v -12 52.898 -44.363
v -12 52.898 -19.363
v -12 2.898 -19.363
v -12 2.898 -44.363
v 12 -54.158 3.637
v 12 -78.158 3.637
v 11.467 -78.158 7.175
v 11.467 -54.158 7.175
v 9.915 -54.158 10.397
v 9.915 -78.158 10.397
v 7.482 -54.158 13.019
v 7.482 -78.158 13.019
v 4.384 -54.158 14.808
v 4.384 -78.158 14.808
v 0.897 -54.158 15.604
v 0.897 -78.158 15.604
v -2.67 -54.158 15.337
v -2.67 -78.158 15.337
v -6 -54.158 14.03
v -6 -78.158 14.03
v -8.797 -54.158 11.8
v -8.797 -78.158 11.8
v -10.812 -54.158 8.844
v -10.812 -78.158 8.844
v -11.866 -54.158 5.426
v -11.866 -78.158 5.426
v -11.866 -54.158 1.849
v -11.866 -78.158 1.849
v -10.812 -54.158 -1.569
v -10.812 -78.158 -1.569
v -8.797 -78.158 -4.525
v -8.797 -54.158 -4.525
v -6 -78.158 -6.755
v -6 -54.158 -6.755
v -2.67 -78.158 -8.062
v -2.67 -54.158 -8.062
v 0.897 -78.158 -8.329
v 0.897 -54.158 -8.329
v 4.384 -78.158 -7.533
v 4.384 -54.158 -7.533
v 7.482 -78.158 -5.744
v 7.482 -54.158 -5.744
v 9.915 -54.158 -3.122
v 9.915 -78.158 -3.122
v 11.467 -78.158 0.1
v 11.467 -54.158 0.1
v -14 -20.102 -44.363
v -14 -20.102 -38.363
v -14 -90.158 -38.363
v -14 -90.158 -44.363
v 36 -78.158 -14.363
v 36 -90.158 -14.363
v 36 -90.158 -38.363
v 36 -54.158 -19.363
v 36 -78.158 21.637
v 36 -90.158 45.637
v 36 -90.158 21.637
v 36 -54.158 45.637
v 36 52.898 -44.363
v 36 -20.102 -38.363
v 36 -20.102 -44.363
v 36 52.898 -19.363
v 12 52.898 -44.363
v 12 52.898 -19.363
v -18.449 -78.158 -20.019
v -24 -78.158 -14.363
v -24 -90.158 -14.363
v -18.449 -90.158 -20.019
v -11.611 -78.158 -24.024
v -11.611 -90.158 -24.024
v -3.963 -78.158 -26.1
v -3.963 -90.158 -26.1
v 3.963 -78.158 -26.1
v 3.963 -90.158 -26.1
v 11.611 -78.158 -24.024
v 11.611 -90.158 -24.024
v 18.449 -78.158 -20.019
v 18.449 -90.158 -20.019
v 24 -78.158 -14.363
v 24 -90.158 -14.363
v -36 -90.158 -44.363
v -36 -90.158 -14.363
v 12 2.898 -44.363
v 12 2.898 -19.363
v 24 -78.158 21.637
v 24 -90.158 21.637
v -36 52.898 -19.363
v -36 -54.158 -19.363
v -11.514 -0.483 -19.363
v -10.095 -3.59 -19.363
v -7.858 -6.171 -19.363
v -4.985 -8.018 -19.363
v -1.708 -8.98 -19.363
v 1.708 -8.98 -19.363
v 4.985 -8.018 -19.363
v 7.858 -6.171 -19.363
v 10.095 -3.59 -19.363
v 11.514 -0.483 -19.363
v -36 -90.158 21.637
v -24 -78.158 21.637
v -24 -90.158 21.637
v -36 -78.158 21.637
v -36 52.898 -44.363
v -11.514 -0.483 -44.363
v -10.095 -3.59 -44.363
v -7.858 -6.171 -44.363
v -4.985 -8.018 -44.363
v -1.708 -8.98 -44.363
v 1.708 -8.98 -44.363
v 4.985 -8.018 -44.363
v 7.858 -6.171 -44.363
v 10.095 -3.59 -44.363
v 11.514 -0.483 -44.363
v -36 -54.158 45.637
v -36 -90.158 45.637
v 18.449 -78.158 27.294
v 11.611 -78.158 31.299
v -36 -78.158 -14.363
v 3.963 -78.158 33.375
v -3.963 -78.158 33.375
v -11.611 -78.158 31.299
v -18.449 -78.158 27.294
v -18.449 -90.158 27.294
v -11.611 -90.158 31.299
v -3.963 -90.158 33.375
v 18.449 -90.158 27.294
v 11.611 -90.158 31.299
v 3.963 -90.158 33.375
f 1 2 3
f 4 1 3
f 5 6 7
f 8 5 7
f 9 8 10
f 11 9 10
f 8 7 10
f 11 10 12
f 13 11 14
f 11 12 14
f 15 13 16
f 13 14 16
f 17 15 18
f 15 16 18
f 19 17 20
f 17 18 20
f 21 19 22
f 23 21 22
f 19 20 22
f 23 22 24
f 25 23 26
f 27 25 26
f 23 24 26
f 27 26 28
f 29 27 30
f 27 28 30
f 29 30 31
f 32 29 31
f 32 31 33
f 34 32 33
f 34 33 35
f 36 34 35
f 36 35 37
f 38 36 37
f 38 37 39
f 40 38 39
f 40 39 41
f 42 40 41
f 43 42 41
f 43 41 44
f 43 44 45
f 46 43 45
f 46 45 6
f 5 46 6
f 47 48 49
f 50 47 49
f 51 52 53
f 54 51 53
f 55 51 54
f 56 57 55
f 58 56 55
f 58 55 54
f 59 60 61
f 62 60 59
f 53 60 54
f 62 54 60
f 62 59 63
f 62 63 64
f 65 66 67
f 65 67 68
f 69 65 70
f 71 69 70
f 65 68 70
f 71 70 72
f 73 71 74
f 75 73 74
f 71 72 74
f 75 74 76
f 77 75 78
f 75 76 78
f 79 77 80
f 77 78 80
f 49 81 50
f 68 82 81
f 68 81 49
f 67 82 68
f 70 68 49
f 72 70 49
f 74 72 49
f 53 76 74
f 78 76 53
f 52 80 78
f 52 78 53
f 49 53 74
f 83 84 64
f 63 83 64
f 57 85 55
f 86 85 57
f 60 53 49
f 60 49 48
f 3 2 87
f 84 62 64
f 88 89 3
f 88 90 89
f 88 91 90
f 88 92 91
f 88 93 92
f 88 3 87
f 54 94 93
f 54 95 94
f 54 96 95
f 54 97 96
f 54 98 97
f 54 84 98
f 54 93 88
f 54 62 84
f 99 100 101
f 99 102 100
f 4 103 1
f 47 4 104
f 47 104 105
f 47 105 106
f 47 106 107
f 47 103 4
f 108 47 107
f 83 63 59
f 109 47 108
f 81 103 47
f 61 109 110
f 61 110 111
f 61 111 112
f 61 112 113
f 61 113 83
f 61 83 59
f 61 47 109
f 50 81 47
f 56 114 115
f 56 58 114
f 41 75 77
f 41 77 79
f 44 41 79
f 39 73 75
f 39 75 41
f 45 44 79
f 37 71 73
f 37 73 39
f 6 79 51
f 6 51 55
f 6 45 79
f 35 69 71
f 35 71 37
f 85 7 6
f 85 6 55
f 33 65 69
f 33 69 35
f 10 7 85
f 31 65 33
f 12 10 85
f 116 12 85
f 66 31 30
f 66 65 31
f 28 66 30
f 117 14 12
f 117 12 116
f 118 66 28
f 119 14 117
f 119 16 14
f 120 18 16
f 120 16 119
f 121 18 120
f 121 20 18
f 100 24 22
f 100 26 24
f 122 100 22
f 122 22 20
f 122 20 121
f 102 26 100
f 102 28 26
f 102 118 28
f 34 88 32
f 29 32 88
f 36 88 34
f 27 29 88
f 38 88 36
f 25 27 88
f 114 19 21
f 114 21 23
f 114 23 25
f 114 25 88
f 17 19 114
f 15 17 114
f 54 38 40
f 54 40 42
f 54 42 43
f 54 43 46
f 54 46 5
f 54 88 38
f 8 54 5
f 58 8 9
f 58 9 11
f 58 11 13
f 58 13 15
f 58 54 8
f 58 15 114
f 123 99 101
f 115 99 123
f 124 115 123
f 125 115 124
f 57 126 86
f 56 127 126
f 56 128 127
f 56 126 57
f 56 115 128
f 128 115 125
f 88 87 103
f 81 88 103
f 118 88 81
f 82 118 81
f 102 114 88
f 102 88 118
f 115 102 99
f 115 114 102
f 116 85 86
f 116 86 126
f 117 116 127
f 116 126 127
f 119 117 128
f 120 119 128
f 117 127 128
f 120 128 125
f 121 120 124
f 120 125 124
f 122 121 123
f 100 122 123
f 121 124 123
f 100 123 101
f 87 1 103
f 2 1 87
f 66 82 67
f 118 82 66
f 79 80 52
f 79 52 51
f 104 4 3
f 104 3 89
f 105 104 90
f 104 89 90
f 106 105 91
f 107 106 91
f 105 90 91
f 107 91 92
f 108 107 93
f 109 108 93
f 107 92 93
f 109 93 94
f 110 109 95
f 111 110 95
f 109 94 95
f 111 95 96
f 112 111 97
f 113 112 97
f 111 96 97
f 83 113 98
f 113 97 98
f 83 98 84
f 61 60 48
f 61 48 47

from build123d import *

# Parameters (mm, degrees)
F1_DEPTH  = 36
F2_W      = 22
F2_H      = 70.056442
F3_DEPTH  = 6
F4_R      = 12
F5_DEPTH  = 143.057441
F6_R      = 30
F7_DEPTH  = 12
F8_W      = 12
F8_H      = 36
F9_W      = 12
F9_H      = 36
F12_DEPTH = 25


with BuildPart() as f1:
    # F0 (on Right) → F1 (new body, symmetric)
    with BuildSketch(Plane.YZ):
        Polygon((-54.158381, 45.637498), (-90.158381, 45.637498), (-90.158381, -38.362502), (-20.101939, -38.362502), (-20.101939, -44.362502), (52.898061, -44.362502), (52.898061, -19.362502), (-54.158381, -19.362502), align=None)
    extrude(amount=F1_DEPTH, both=True)

    # F2 (on face) → F3 (join)
    with BuildSketch(Plane(origin=(0, 0, -38.362502), x_dir=(1, 0, 0), z_dir=(0, 0, -1))):
        with Locations((-25, 55.13016)):
            Rectangle(F2_W, F2_H)
    extrude(amount=F3_DEPTH)

    # F4 (on face) → F5 (cut, through all)
    with BuildSketch(Plane.XZ.offset(90.158381)):
        with Locations((0, 3.637498)):
            Circle(F4_R)
    extrude(amount=-F5_DEPTH, mode=Mode.SUBTRACT)

    # F6 (on face) → F7 (cut)
    with BuildSketch(Plane.XZ.offset(90.158381)):
        with Locations((0, 3.637498)):
            Circle(F6_R)
    extrude(amount=-F7_DEPTH, mode=Mode.SUBTRACT)

    # F8 (on face) → F10 section 0
    with BuildSketch(Plane.YZ.offset(36)):
        with Locations((-84.158381, 3.637498)):
            Rectangle(F8_W, F8_H)
    # F9 (on face) → F10 section 1
    with BuildSketch(Plane(origin=(-36, 0, 0), x_dir=(0, -1, 0), z_dir=(-1, 0, 0))):
        with Locations((84.158381, 3.637498)):
            Rectangle(F9_W, F9_H)
    loft(mode=Mode.SUBTRACT)

    # F11 (on face) → F12 (cut)
    with BuildSketch(Plane.XY.offset(-19.362502)):
        with BuildLine():
            Line((12, 2.898061), (12, 52.898061))
            Line((12, 52.898061), (-12, 52.898061))
            Line((-12, 52.898061), (-12, 2.898061))
            ThreePointArc((-12, 2.898061), (0, -9.101939), (12, 2.898061))
        make_face()
    extrude(amount=-F12_DEPTH, mode=Mode.SUBTRACT)


solid = f1.part
